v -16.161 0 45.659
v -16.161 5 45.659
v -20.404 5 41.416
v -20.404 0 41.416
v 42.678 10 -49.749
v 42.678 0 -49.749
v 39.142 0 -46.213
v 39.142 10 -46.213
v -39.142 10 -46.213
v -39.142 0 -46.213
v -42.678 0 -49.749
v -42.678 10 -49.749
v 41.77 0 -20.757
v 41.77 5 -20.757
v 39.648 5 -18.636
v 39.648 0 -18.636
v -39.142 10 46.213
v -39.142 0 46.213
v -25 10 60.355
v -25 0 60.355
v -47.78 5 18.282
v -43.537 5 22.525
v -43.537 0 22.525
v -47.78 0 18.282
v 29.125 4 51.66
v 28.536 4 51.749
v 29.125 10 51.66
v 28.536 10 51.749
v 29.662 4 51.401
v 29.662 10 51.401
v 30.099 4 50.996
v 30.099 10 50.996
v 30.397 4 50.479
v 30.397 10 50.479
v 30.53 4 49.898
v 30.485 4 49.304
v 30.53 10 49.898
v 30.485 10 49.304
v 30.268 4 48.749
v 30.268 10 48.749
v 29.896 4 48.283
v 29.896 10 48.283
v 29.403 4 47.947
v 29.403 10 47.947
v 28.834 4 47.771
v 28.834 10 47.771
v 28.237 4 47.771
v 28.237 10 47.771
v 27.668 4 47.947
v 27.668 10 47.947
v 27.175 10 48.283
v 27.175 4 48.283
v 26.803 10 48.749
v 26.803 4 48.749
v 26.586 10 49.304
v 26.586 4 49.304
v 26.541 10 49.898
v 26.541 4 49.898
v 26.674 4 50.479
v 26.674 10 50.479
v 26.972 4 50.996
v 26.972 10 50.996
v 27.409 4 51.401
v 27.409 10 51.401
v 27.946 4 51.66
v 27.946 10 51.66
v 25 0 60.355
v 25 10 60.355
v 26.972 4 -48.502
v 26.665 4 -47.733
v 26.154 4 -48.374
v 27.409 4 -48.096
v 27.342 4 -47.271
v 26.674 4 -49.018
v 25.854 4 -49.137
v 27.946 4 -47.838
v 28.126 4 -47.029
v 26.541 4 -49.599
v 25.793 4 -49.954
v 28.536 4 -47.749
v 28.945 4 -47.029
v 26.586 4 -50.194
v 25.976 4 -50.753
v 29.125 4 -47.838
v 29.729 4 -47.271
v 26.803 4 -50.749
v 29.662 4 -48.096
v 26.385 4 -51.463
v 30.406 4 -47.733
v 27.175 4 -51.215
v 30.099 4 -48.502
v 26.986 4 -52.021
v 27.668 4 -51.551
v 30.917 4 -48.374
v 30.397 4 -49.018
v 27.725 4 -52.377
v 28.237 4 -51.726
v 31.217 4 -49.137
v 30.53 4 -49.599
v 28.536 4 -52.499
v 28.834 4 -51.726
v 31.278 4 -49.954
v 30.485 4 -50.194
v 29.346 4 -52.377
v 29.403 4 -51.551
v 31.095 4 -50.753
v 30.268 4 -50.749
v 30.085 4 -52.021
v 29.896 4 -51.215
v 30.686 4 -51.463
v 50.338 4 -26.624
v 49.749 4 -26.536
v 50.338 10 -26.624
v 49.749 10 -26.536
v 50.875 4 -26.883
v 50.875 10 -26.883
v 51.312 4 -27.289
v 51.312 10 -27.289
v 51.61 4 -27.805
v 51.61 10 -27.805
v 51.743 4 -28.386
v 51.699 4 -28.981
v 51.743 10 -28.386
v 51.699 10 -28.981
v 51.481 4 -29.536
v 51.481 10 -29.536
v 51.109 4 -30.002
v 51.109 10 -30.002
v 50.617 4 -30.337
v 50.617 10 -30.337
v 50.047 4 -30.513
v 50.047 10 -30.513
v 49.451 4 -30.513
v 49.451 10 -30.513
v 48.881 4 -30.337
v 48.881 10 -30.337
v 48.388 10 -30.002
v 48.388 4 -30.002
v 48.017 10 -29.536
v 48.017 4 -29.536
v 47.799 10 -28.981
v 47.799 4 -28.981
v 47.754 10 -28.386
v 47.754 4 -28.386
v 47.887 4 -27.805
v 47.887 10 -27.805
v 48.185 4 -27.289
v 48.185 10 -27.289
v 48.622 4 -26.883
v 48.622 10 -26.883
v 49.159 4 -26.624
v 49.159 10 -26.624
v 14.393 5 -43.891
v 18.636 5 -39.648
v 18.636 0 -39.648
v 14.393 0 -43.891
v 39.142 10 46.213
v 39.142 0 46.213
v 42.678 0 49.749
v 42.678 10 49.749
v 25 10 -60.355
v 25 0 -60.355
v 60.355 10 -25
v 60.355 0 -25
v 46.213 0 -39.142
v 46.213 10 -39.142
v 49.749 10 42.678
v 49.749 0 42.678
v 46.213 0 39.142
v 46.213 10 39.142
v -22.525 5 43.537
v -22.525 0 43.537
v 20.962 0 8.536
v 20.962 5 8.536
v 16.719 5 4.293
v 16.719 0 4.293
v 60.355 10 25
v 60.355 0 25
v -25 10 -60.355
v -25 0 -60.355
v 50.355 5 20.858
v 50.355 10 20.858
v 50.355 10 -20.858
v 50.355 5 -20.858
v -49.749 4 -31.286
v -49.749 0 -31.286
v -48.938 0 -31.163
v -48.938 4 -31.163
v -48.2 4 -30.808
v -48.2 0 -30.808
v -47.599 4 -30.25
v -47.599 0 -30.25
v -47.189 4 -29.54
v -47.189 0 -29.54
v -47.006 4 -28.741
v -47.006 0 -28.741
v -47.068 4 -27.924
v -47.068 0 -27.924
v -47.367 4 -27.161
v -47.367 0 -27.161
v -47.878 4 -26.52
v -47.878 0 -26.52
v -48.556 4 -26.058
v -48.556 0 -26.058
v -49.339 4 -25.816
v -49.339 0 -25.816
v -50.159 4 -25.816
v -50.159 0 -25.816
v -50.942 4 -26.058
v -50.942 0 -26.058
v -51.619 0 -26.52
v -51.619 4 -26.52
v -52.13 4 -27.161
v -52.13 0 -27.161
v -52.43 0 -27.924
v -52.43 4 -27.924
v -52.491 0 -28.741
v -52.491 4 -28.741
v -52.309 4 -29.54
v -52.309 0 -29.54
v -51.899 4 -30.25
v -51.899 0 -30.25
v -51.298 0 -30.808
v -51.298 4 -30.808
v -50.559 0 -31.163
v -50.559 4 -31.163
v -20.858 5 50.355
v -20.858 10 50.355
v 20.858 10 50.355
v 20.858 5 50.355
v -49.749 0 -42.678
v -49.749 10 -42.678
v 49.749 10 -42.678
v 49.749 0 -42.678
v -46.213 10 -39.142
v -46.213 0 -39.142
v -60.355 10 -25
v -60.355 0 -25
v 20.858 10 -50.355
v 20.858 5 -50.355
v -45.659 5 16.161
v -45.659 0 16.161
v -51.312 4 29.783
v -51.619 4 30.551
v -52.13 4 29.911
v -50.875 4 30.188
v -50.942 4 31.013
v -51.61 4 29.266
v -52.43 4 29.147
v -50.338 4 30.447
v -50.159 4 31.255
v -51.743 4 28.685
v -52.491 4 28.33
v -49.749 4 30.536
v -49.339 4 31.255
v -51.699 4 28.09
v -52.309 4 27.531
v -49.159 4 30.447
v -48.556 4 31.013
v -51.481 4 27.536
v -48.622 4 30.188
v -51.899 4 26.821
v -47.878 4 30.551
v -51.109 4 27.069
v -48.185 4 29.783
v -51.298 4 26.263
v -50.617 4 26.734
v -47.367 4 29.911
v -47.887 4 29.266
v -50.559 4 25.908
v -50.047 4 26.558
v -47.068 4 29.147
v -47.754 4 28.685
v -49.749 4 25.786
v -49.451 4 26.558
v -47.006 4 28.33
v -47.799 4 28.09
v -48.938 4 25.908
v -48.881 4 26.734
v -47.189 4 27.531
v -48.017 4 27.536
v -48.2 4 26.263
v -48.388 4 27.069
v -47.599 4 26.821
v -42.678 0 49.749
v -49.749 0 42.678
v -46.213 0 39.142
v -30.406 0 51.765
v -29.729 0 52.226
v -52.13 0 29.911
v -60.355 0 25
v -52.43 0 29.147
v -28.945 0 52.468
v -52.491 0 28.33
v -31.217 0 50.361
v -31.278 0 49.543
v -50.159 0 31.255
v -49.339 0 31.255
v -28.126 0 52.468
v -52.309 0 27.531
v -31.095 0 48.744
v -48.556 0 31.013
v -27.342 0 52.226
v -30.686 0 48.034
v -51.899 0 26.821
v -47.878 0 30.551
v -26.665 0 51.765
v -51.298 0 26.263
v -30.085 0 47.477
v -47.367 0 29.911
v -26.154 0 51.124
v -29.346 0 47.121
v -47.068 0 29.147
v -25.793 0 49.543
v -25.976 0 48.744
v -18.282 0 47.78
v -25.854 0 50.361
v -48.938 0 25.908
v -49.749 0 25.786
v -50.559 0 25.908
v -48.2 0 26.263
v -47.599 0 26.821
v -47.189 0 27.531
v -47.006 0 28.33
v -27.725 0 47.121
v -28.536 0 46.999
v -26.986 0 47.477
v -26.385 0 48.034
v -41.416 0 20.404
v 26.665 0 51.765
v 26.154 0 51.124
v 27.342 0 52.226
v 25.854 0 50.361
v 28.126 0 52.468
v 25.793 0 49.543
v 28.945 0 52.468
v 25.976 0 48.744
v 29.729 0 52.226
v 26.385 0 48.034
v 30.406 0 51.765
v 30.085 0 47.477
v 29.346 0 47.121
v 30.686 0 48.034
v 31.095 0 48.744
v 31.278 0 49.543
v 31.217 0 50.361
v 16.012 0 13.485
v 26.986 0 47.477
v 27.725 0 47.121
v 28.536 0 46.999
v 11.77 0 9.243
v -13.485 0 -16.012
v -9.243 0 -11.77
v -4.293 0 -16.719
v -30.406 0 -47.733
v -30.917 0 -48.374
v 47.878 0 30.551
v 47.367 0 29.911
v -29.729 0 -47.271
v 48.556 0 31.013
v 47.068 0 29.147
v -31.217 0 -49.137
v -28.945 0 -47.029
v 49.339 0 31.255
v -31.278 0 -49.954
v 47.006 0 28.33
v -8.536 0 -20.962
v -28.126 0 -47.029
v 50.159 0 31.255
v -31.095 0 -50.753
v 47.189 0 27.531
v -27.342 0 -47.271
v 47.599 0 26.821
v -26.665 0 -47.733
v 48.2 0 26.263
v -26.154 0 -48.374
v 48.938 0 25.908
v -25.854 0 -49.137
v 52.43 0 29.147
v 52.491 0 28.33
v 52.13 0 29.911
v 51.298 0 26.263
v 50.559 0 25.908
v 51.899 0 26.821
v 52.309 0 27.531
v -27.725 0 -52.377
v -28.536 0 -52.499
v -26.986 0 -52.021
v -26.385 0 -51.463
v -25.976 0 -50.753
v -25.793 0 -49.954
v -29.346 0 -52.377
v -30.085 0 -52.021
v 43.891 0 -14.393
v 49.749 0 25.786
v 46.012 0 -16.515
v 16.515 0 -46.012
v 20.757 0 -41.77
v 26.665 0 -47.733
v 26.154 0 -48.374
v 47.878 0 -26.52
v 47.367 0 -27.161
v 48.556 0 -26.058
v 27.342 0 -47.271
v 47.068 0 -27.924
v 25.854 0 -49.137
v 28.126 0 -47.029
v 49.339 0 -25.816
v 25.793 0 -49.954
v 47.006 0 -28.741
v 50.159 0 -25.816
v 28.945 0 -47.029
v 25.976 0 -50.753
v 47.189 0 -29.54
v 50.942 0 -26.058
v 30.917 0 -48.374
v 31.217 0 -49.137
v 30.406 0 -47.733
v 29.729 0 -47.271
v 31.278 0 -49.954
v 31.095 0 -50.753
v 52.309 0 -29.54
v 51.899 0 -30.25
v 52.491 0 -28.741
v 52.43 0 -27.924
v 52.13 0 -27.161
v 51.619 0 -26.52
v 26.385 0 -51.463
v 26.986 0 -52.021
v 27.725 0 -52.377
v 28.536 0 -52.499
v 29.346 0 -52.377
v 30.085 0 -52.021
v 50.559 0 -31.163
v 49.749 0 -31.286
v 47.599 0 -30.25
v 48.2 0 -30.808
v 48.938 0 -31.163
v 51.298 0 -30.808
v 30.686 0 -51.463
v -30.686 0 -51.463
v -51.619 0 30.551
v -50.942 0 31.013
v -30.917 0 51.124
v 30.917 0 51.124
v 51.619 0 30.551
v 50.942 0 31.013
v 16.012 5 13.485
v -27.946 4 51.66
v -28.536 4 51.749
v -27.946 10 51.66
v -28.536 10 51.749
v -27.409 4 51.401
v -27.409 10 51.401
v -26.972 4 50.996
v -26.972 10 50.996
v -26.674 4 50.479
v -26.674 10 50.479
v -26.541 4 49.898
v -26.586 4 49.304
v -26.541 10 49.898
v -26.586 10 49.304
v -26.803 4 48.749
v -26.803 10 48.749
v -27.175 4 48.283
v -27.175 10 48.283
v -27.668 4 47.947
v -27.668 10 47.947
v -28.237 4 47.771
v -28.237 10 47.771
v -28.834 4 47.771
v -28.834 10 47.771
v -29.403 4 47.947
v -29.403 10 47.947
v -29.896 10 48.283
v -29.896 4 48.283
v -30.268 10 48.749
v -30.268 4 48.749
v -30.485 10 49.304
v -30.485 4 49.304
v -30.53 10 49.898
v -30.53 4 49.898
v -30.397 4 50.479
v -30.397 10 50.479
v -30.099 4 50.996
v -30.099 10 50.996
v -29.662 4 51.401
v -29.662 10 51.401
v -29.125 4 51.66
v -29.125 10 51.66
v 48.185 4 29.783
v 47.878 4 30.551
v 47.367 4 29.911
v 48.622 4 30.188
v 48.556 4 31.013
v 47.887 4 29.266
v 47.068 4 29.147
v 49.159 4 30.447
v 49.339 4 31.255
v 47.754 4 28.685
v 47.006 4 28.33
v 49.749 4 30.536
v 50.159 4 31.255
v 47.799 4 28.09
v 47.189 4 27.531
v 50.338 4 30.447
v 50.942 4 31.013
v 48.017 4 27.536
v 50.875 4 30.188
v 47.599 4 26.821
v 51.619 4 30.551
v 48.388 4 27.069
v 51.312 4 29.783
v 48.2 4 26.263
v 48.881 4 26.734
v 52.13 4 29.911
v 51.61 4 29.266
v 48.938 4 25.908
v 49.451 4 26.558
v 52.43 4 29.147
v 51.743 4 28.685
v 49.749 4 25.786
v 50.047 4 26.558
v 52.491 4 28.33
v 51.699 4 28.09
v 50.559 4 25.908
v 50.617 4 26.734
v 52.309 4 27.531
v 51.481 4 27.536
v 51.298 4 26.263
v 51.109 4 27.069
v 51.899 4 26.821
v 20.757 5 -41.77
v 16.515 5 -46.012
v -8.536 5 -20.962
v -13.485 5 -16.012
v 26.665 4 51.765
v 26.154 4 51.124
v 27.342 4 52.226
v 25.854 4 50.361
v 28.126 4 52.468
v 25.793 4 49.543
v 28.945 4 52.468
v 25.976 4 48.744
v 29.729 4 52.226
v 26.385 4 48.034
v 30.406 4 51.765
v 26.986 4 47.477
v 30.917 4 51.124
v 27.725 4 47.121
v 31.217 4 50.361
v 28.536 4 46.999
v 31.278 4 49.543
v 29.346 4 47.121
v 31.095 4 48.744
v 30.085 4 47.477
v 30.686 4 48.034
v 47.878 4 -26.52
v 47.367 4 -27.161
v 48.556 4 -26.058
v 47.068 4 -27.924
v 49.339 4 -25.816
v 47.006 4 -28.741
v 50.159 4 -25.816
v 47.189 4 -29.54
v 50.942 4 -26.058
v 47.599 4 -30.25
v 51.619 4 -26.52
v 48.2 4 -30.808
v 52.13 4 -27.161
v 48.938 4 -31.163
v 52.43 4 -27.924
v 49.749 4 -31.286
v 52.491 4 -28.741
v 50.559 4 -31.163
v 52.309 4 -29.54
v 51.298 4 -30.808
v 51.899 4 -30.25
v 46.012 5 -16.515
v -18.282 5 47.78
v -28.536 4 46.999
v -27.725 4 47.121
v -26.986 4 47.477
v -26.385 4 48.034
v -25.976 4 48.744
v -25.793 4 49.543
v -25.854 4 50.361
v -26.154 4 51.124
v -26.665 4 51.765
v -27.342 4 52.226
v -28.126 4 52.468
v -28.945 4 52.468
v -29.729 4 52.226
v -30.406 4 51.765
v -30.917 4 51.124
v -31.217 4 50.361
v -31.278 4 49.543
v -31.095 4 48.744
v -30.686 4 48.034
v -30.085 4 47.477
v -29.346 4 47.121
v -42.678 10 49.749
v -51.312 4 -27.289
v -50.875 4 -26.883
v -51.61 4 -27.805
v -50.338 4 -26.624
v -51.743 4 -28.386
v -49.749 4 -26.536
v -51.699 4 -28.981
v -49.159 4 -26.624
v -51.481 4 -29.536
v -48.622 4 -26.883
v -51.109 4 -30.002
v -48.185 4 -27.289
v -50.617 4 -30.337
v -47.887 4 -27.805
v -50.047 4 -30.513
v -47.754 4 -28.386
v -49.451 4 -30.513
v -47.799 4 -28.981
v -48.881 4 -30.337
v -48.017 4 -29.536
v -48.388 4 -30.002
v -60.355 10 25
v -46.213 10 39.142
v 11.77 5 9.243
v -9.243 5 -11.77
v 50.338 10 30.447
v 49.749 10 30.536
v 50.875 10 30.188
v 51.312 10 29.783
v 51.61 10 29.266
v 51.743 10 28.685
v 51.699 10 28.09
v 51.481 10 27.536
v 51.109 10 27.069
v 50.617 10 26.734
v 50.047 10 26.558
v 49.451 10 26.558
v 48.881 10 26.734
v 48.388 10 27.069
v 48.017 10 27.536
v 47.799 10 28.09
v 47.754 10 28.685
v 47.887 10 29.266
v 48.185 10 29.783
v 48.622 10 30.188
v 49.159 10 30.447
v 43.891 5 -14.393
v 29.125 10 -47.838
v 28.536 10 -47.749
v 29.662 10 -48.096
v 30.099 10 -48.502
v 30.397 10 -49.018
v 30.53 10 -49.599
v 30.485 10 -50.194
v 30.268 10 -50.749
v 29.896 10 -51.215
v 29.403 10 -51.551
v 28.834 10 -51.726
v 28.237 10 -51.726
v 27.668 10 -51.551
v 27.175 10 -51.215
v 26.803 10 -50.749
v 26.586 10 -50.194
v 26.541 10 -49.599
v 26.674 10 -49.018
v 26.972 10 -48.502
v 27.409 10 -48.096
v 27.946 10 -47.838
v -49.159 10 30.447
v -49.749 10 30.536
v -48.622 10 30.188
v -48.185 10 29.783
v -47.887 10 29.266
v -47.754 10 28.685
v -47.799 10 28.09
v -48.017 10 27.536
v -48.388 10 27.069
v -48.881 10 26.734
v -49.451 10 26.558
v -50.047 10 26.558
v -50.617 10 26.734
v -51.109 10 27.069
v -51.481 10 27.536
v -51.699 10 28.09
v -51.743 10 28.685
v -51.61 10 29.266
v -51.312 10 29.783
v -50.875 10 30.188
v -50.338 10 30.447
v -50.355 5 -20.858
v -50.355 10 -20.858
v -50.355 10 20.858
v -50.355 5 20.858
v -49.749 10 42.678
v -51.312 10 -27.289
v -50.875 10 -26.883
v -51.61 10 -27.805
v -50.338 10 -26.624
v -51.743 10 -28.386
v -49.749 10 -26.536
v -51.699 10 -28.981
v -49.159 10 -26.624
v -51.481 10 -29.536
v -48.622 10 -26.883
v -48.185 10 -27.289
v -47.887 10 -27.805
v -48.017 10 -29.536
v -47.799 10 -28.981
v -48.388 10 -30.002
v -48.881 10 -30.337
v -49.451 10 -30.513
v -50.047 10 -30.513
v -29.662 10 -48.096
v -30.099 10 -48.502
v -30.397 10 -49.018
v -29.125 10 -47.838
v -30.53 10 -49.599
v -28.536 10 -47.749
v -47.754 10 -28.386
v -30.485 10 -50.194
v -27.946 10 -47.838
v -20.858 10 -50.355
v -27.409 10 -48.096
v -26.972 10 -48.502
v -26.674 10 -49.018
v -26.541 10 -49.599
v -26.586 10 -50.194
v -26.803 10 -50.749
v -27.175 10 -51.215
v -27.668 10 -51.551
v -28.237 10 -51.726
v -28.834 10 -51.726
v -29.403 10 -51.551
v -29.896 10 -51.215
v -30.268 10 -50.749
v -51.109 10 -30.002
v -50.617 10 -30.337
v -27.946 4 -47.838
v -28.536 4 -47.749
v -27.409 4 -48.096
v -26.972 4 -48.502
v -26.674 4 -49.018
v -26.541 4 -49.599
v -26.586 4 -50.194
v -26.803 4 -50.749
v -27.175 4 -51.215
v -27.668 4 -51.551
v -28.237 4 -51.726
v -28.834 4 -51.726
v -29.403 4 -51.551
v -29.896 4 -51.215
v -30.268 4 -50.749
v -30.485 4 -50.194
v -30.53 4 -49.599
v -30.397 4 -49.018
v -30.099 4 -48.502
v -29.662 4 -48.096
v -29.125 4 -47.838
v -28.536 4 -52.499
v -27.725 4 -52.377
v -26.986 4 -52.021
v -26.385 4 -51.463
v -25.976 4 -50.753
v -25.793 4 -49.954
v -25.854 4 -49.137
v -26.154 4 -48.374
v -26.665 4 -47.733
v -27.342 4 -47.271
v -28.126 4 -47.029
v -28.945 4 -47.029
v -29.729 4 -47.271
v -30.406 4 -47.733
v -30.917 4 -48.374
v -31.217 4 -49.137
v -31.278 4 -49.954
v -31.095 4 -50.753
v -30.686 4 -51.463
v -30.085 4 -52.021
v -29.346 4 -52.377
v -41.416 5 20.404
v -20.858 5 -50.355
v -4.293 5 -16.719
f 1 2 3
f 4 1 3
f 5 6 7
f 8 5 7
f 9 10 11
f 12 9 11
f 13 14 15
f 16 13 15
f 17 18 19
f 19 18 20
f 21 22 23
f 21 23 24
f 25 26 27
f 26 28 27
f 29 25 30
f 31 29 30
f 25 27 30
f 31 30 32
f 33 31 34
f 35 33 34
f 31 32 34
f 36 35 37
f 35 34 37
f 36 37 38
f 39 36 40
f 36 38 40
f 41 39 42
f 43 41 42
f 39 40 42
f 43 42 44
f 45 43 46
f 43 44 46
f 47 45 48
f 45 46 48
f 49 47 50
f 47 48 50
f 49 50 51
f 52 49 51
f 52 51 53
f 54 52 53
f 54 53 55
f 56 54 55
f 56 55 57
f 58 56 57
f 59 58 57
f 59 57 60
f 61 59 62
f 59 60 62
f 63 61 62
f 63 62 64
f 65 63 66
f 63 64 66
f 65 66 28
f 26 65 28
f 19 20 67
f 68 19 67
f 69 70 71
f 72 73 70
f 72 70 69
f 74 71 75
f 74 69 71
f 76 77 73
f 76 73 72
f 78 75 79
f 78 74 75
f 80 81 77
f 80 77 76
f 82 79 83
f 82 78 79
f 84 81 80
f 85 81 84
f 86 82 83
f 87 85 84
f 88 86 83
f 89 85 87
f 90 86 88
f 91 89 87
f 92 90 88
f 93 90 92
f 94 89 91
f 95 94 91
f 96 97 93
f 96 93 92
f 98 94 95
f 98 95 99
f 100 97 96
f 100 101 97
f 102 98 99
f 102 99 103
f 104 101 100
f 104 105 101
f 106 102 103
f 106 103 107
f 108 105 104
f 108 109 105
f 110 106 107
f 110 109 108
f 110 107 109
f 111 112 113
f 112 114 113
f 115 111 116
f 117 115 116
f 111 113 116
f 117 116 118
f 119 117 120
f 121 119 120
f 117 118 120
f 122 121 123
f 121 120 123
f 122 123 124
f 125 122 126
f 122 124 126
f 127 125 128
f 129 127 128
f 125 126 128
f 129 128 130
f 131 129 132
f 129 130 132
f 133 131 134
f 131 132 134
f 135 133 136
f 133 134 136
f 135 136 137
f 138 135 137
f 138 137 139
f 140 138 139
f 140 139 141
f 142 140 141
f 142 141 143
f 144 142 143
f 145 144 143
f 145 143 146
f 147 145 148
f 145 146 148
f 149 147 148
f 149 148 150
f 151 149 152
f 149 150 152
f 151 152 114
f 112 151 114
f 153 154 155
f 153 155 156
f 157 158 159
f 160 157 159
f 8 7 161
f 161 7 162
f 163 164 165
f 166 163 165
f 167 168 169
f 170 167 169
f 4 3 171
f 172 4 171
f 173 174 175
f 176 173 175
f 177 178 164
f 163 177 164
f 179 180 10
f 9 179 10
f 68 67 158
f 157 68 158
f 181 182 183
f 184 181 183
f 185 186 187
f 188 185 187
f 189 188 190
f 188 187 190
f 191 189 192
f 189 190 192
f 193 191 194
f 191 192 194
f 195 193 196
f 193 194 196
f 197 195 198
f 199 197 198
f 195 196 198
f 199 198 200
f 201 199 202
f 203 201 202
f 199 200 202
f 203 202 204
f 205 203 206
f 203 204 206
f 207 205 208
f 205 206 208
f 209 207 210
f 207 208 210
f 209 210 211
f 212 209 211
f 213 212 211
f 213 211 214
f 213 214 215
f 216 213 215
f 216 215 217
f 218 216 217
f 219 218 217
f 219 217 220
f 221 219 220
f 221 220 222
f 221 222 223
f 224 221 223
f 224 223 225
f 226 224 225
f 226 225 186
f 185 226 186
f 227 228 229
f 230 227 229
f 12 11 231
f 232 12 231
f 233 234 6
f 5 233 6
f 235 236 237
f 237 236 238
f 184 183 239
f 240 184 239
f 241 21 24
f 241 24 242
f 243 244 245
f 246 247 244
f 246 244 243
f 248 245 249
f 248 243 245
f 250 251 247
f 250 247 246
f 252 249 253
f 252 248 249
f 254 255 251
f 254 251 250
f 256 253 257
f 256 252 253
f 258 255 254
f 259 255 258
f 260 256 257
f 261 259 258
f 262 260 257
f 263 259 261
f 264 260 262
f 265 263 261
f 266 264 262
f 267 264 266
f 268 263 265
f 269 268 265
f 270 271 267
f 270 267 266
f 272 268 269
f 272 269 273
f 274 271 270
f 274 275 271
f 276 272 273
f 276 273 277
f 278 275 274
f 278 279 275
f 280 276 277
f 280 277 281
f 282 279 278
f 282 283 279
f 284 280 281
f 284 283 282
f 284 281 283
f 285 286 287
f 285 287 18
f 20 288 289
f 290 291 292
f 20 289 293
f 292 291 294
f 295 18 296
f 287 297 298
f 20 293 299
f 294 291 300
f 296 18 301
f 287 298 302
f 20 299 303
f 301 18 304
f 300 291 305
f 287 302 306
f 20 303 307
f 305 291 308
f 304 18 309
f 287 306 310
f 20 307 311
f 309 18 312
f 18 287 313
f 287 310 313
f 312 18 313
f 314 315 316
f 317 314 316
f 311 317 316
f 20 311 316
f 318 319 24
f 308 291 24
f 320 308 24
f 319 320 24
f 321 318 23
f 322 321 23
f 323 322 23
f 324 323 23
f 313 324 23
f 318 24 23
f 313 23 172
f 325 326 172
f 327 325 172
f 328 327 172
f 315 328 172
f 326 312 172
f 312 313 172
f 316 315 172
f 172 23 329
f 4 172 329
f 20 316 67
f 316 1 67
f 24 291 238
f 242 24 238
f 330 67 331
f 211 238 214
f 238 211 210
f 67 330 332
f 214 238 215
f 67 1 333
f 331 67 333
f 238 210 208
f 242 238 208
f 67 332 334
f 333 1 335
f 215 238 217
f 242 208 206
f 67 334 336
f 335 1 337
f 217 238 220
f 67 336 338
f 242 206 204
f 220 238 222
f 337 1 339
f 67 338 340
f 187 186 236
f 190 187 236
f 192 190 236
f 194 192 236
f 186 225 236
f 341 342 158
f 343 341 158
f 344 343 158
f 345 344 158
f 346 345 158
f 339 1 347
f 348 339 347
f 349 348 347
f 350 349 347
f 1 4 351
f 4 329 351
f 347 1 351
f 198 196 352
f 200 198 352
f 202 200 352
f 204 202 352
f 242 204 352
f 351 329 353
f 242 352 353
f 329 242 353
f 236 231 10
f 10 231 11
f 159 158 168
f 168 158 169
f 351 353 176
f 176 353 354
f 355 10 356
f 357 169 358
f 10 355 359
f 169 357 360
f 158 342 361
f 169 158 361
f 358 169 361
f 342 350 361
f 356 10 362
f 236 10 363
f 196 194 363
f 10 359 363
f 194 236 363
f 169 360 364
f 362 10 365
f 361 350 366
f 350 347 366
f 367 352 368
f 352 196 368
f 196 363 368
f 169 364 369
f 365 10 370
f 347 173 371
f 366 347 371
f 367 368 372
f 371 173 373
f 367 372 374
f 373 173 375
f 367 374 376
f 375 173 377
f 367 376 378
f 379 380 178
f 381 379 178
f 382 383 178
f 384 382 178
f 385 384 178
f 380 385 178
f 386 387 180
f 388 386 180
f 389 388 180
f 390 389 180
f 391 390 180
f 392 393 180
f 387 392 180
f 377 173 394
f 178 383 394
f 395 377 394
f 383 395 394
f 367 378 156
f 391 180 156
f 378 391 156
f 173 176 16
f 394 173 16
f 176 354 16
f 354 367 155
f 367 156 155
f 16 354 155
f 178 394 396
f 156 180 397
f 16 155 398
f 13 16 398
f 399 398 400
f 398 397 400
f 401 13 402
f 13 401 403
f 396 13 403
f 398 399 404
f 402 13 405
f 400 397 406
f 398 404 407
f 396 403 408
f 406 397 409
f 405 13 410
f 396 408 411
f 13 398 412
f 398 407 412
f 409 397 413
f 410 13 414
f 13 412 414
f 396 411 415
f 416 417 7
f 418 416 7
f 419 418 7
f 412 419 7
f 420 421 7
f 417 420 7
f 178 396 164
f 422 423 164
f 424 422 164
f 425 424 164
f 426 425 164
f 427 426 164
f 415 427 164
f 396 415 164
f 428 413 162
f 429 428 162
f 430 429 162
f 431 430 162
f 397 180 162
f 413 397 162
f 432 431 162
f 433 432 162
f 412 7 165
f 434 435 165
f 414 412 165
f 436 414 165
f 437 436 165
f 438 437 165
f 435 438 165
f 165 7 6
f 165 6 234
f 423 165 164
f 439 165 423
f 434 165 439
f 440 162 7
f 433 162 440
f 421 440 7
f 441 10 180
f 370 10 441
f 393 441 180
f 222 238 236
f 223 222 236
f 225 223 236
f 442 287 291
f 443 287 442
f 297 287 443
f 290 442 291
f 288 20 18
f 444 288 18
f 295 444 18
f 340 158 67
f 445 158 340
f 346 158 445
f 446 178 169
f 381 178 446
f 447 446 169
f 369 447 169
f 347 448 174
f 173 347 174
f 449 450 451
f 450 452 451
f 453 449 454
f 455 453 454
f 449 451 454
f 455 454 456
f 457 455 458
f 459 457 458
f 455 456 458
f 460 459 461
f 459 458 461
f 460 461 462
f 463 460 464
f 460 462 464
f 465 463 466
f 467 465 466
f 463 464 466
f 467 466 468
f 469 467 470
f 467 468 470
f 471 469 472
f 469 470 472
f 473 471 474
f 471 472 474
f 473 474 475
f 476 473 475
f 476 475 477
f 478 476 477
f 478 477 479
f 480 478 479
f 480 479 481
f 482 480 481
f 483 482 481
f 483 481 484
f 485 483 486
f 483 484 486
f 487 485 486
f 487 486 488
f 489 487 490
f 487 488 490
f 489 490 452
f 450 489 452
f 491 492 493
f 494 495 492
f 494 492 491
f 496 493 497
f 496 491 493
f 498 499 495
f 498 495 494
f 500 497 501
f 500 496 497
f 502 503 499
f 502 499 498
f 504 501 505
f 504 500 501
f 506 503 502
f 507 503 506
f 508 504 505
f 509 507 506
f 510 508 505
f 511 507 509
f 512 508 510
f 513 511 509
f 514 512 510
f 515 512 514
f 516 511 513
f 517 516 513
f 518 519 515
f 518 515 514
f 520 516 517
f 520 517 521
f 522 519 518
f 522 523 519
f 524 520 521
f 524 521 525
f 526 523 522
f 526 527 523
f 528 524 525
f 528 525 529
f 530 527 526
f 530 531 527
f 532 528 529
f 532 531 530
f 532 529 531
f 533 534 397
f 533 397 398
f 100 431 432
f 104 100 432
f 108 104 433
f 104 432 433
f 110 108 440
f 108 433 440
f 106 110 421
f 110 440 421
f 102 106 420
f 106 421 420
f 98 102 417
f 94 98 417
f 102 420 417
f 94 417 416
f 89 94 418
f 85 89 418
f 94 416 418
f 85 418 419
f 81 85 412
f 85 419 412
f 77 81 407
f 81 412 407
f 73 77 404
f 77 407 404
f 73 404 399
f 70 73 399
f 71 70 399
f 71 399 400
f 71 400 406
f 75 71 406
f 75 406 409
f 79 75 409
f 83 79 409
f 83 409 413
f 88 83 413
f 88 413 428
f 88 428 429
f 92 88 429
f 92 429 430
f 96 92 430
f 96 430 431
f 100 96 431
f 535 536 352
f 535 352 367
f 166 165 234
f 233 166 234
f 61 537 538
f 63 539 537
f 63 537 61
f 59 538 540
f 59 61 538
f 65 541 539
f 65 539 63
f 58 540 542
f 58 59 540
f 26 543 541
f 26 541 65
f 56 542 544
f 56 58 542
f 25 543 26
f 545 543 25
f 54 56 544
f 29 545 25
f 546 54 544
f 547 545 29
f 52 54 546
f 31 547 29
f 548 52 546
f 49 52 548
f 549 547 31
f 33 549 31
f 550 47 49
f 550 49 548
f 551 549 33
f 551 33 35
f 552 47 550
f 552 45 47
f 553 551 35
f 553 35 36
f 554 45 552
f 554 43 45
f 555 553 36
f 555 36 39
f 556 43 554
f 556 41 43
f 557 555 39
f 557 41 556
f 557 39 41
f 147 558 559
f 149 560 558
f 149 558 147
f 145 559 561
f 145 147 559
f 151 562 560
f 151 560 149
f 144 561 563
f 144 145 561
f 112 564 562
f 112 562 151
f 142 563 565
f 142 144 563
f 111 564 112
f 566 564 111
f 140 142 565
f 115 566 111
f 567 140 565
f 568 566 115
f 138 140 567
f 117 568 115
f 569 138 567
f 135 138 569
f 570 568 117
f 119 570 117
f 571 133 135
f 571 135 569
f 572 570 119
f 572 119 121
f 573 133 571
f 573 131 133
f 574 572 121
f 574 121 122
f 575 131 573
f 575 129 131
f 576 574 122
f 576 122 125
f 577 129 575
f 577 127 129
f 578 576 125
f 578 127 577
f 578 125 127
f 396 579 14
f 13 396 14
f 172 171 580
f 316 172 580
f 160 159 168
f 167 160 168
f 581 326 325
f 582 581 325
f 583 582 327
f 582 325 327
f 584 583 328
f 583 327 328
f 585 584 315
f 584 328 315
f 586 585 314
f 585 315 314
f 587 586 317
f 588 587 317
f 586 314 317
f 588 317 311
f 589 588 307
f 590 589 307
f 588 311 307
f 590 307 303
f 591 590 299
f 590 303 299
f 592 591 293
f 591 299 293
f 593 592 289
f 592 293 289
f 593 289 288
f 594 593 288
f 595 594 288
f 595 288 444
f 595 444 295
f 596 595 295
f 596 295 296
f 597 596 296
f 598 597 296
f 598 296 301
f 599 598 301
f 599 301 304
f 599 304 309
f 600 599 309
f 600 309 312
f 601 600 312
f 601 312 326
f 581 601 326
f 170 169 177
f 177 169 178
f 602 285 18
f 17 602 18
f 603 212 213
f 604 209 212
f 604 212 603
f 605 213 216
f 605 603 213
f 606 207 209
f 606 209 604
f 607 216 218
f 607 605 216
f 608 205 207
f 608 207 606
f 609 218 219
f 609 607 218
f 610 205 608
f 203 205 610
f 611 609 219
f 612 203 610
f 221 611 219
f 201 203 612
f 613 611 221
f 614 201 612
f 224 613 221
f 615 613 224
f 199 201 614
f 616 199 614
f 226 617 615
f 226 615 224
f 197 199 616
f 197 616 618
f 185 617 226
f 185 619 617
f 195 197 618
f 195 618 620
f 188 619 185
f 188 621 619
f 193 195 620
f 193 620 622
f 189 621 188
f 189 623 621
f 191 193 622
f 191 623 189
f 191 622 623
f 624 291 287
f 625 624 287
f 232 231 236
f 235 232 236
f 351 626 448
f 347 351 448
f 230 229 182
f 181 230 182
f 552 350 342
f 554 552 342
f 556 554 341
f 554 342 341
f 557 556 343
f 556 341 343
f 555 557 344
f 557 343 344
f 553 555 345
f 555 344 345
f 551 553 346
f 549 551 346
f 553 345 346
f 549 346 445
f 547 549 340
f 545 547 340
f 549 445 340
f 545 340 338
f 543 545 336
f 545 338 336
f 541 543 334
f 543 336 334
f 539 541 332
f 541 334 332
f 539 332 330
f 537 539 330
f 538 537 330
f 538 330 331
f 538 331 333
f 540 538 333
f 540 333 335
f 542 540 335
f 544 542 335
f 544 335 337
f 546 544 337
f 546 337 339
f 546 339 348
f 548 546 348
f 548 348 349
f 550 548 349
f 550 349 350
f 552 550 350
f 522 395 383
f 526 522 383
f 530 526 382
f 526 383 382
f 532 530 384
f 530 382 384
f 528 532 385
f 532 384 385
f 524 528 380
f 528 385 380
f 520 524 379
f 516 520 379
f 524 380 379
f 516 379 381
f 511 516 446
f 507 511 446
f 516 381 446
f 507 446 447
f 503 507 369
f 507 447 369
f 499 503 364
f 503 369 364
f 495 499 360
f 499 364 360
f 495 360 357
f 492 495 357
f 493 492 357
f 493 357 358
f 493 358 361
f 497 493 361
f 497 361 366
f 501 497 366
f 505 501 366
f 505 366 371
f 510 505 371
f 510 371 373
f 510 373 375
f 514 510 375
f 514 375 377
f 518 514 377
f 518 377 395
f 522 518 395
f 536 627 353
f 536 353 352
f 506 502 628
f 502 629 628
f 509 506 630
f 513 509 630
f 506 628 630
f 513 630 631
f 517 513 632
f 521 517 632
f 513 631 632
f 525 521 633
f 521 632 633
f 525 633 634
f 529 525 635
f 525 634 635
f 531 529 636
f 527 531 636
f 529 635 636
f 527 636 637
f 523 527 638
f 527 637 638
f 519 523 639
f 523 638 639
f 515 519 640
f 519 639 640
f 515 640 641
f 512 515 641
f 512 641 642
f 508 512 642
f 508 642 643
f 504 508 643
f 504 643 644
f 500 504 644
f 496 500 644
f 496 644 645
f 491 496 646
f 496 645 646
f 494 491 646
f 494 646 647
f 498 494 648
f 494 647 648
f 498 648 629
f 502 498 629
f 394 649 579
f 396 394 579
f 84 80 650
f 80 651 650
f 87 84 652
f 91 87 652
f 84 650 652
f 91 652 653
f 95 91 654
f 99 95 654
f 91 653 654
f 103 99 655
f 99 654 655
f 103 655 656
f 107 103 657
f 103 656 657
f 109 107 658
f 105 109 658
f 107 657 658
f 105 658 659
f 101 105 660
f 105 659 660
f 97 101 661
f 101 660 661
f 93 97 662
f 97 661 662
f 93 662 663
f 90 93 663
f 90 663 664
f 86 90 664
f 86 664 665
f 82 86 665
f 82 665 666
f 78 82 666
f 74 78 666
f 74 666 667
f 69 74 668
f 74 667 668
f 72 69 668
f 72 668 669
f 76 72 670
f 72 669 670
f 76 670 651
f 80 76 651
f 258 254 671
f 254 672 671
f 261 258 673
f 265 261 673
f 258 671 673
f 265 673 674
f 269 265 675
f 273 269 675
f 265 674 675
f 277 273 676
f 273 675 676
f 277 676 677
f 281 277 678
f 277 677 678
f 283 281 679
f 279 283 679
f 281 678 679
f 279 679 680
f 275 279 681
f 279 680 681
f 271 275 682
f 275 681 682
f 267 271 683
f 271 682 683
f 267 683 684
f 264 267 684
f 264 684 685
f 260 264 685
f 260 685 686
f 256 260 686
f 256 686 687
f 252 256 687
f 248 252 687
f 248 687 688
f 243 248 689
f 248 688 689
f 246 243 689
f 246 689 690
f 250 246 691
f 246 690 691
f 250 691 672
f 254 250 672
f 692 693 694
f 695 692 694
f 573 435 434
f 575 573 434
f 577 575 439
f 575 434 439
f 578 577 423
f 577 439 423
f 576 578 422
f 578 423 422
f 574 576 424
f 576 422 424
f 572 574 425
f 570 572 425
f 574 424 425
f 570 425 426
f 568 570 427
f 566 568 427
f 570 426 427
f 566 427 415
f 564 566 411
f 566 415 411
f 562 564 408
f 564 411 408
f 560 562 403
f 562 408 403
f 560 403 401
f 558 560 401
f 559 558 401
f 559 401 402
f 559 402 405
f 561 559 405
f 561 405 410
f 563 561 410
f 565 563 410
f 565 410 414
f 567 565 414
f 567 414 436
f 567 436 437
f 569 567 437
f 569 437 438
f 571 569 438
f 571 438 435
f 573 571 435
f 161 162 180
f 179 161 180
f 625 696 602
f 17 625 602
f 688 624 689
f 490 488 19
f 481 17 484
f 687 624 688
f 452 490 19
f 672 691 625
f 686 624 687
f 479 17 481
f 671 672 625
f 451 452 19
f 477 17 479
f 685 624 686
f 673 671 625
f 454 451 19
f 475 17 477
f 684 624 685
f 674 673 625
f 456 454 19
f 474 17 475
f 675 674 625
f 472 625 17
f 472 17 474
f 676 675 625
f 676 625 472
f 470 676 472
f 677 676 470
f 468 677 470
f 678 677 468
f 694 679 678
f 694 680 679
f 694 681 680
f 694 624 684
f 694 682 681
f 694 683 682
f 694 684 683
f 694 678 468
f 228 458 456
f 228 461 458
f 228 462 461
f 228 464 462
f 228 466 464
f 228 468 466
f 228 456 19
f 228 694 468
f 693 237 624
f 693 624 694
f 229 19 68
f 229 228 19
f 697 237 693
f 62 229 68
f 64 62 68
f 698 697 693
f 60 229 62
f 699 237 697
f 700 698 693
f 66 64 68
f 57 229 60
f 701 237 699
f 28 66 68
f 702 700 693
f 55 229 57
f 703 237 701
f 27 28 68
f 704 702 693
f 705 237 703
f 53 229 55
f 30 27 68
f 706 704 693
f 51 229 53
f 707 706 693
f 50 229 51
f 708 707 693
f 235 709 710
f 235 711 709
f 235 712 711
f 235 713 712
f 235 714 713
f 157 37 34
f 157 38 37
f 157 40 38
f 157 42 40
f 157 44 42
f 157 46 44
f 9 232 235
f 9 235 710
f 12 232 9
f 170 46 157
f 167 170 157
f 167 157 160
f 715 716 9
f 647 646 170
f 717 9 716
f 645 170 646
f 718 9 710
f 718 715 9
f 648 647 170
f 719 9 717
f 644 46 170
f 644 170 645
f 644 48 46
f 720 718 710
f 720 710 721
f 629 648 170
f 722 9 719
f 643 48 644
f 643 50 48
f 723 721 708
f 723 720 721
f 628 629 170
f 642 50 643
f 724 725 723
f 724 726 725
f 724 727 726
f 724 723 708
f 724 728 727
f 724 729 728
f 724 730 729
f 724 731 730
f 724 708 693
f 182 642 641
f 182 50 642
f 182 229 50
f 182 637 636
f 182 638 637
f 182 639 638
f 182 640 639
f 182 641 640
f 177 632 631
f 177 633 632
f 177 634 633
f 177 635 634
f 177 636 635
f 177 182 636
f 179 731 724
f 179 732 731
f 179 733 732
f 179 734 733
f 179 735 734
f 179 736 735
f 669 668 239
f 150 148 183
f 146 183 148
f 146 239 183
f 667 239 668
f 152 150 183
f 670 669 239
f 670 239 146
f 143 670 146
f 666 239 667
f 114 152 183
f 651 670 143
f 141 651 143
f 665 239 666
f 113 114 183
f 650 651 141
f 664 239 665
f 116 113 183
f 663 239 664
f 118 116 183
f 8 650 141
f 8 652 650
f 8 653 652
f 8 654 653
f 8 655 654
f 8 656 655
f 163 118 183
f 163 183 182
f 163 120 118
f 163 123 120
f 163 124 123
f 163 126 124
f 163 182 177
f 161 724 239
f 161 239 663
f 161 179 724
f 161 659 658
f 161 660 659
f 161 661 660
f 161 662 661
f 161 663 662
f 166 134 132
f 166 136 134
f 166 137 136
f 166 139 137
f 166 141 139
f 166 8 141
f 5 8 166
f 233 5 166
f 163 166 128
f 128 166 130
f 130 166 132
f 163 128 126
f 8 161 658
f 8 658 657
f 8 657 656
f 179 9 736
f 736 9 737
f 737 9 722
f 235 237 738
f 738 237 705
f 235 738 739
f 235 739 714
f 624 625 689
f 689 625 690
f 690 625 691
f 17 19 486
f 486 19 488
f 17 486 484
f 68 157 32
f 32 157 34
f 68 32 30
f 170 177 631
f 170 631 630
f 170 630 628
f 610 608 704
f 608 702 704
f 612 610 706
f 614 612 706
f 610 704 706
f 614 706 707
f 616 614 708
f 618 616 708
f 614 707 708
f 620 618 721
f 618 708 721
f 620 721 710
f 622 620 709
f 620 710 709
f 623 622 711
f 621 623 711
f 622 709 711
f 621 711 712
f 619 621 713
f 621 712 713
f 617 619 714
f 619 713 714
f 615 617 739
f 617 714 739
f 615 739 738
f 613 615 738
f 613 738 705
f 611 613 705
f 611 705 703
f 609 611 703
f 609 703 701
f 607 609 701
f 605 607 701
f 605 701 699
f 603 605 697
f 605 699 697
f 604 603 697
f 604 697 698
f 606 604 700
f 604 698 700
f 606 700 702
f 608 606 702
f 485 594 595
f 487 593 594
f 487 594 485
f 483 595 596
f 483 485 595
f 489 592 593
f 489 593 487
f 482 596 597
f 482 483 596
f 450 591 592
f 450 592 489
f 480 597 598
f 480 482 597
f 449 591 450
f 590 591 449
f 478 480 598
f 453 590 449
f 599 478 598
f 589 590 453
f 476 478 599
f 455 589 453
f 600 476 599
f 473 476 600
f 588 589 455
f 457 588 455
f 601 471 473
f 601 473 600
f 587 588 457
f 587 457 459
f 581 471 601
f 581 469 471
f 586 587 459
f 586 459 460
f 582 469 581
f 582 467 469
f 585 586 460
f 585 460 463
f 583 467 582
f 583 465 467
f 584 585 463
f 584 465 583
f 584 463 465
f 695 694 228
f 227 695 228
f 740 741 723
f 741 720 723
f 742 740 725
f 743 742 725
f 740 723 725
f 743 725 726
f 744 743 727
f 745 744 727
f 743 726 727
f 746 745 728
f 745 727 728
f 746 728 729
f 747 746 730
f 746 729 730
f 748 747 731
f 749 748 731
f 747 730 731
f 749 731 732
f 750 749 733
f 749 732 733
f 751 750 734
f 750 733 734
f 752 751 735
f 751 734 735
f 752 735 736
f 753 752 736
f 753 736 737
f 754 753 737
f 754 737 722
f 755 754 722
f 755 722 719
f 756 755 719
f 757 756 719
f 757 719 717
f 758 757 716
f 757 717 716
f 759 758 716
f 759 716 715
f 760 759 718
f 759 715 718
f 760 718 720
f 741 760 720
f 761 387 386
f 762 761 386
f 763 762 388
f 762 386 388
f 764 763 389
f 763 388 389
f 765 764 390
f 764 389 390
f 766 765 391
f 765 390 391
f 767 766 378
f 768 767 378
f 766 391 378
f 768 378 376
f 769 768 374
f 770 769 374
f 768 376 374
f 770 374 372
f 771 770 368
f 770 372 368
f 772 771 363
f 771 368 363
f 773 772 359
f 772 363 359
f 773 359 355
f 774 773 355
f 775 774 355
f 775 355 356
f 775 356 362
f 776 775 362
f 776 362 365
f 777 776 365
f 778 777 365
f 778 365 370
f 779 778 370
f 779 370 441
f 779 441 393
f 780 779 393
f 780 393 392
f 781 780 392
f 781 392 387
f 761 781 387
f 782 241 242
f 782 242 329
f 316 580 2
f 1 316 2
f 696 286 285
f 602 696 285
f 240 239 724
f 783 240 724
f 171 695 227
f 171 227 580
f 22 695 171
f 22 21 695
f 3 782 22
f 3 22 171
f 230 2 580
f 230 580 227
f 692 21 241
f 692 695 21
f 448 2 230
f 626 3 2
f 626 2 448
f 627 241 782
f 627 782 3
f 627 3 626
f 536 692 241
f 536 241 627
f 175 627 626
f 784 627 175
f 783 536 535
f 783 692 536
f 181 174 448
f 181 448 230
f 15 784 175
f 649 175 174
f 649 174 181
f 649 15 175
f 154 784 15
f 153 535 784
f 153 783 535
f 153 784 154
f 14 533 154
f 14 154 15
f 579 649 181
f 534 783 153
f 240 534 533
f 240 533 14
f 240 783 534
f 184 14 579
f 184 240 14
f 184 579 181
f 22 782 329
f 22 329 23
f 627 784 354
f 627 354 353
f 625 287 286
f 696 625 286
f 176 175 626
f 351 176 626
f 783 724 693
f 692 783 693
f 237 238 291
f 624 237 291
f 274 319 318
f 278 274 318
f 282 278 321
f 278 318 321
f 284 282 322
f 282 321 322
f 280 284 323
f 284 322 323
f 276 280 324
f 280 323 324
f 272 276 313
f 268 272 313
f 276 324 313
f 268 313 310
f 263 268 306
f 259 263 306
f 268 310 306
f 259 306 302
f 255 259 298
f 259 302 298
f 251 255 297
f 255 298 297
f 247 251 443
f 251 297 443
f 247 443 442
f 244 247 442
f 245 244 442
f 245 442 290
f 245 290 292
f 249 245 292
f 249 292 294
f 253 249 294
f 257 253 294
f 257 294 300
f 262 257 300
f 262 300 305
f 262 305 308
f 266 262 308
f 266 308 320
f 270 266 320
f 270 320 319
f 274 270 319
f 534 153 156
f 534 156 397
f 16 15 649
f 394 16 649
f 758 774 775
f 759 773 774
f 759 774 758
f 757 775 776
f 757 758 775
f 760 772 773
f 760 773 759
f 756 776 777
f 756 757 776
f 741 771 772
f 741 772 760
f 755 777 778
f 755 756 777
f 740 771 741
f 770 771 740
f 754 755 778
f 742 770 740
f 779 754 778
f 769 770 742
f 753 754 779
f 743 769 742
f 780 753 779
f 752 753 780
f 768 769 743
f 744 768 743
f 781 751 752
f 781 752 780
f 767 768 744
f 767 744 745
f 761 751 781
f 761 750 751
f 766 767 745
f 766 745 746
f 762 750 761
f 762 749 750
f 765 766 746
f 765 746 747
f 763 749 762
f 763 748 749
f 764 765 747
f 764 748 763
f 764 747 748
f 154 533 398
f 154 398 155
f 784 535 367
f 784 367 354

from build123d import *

# Parameters (mm, degrees)
BOSS_EXTRU_2_DEPTH                                   = 10
CHAMBRAGE_POUR_T_TE_CYLINDRIQUE_FENDUE_M_D           = 4
CHAMBRAGE_POUR_T_TE_CYLINDRIQUE_FENDUE_M_CBORE_D     = 5.5
CHAMBRAGE_POUR_T_TE_CYLINDRIQUE_FENDUE_M_CBORE_DEPTH = 4
ENL_V_MAT_EXTRU_1_DEPTH                              = 5
ENL_V_MAT_EXTRU_2_REACH                              = 87.502


with BuildPart() as part:
    # Esquisse1 → Boss.-Extru.2 (new body)
    with BuildSketch(Plane(origin=(0, 0, 0), x_dir=(1, 0, 0), z_dir=(0, 1, 0))):
        Polygon((60.355339059, 25), (25, 60.355339059), (-25, 60.355339059), (-60.355339059, 25), (-60.355339059, -25), (-25, -60.355339059), (25, -60.355339059), (60.355339059, -25), align=None)
        Polygon((39.142135624, 46.213203436), (46.213203436, 39.142135624), (49.748737342, 42.67766953), (42.67766953, 49.748737342), align=None)
        Polygon((49.748737342, -42.67766953), (46.213203436, -39.142135624), (39.142135624, -46.213203436), (42.67766953, -49.748737342), align=None)
        Polygon((-42.67766953, -49.748737342), (-39.142135624, -46.213203436), (-46.213203436, -39.142135624), (-49.748737342, -42.67766953), align=None)
        Polygon((-46.213203436, 39.142135624), (-39.142135624, 46.213203436), (-42.67766953, 49.748737342), (-49.748737342, 42.67766953), align=None)
    extrude(amount=BOSS_EXTRU_2_DEPTH)

    # Chambrage pour tête cylindrique fendue M31 (through all)
    with Locations(Plane(origin=(-49.748737342, 0, -28.535533906), x_dir=(0, 0, -1), z_dir=(0, -1, 0))):
        with Locations((0, 0), (21.213203436, 21.213203436), (21.213203436, 78.284271248), (0, 99.497474684), (-78.284271248, 78.284271248), (-57.071067812, 99.497474684), (-78.284271248, 21.213203436), (-57.071067812, 0)):
            CounterBoreHole(CHAMBRAGE_POUR_T_TE_CYLINDRIQUE_FENDUE_M_D / 2, CHAMBRAGE_POUR_T_TE_CYLINDRIQUE_FENDUE_M_CBORE_D / 2, CHAMBRAGE_POUR_T_TE_CYLINDRIQUE_FENDUE_M_CBORE_DEPTH)

    # Esquisse6 → Enlèv. mat.-Extru.1 (cut)
    with BuildSketch(Plane(origin=(0, 10, 0), x_dir=(1, 0, 0), z_dir=(0, 1, 0))):
        Polygon((20.857864376, 50.355339059), (-20.857864376, 50.355339059), (-50.355339059, 20.857864376), (-50.355339059, -20.857864376), (-20.857864376, -50.355339059), (20.857864376, -50.355339059), (50.355339059, -20.857864376), (50.355339059, 20.857864376), align=None)
    extrude(amount=-ENL_V_MAT_EXTRU_1_DEPTH, mode=Mode.SUBTRACT)

    # Esquisse7 → Enlèv. mat.-Extru.2 (cut, up to next)
    with BuildSketch(Plane(origin=(0, 5, 0), x_dir=(1, 0, 0), z_dir=(0, 1, 0)), mode=Mode.PRIVATE) as enl_v_mat_extru_2_sk1:
        Polygon((-47.779960262, -18.282485579), (-45.658639918, -16.161165235), (-41.415999231, -20.403805922), (-43.537319575, -22.525126266), align=None)
    enl_v_mat_extru_2_tool1 = extrude(enl_v_mat_extru_2_sk1.sketch, amount=-ENL_V_MAT_EXTRU_2_REACH, mode=Mode.PRIVATE) & part.part
    # Esquisse7 → Enlèv. mat.-Extru.2 (cut, up to next)
    with BuildSketch(Plane(origin=(0, 5, 0), x_dir=(1, 0, 0), z_dir=(0, 1, 0)), mode=Mode.PRIVATE) as enl_v_mat_extru_2_sk2:
        Polygon((-13.485281374, 16.012193309), (-8.535533906, 20.961940777), (-4.292893219, 16.71930009), (-9.242640687, 11.769552622), align=None)
    enl_v_mat_extru_2_tool2 = extrude(enl_v_mat_extru_2_sk2.sketch, amount=-ENL_V_MAT_EXTRU_2_REACH, mode=Mode.PRIVATE) & part.part
    # Esquisse7 → Enlèv. mat.-Extru.2 (cut, up to next)
    with BuildSketch(Plane(origin=(0, 5, 0), x_dir=(1, 0, 0), z_dir=(0, 1, 0)), mode=Mode.PRIVATE) as enl_v_mat_extru_2_sk3:
        Polygon((14.393398282, 43.890872965), (16.514718626, 46.012193309), (20.757359313, 41.769552622), (18.636038969, 39.648232278), align=None)
    enl_v_mat_extru_2_tool3 = extrude(enl_v_mat_extru_2_sk3.sketch, amount=-ENL_V_MAT_EXTRU_2_REACH, mode=Mode.PRIVATE) & part.part
    # Esquisse7 → Enlèv. mat.-Extru.2 (cut, up to next)
    with BuildSketch(Plane(origin=(0, 5, 0), x_dir=(1, 0, 0), z_dir=(0, 1, 0)), mode=Mode.PRIVATE) as enl_v_mat_extru_2_sk4:
        Polygon((-20.403805922, -41.415999231), (-22.525126266, -43.537319575), (-18.282485579, -47.779960262), (-16.161165235, -45.658639918), align=None)
    enl_v_mat_extru_2_tool4 = extrude(enl_v_mat_extru_2_sk4.sketch, amount=-ENL_V_MAT_EXTRU_2_REACH, mode=Mode.PRIVATE) & part.part
    # Esquisse7 → Enlèv. mat.-Extru.2 (cut, up to next)
    with BuildSketch(Plane(origin=(0, 5, 0), x_dir=(1, 0, 0), z_dir=(0, 1, 0)), mode=Mode.PRIVATE) as enl_v_mat_extru_2_sk5:
        Polygon((39.648232278, 18.636038969), (43.890872965, 14.393398282), (46.012193309, 16.514718626), (41.769552622, 20.757359313), align=None)
    enl_v_mat_extru_2_tool5 = extrude(enl_v_mat_extru_2_sk5.sketch, amount=-ENL_V_MAT_EXTRU_2_REACH, mode=Mode.PRIVATE) & part.part
    # Esquisse7 → Enlèv. mat.-Extru.2 (cut, up to next)
    with BuildSketch(Plane(origin=(0, 5, 0), x_dir=(1, 0, 0), z_dir=(0, 1, 0)), mode=Mode.PRIVATE) as enl_v_mat_extru_2_sk6:
        Polygon((16.71930009, -4.292893219), (11.769552622, -9.242640687), (16.012193309, -13.485281374), (20.961940777, -8.535533906), align=None)
    enl_v_mat_extru_2_tool6 = extrude(enl_v_mat_extru_2_sk6.sketch, amount=-ENL_V_MAT_EXTRU_2_REACH, mode=Mode.PRIVATE) & part.part
    add(enl_v_mat_extru_2_tool1.solids().sort_by_distance((-44.59798, 5, 19.343146))[0], mode=Mode.SUBTRACT)
    add(enl_v_mat_extru_2_tool2.solids().sort_by_distance((-8.889087, 5, -16.365747))[0], mode=Mode.SUBTRACT)
    add(enl_v_mat_extru_2_tool3.solids().sort_by_distance((17.575379, 5, -42.830213))[0], mode=Mode.SUBTRACT)
    add(enl_v_mat_extru_2_tool4.solids().sort_by_distance((-19.343146, 5, 44.59798))[0], mode=Mode.SUBTRACT)
    add(enl_v_mat_extru_2_tool5.solids().sort_by_distance((42.830213, 5, -17.575379))[0], mode=Mode.SUBTRACT)
    add(enl_v_mat_extru_2_tool6.solids().sort_by_distance((16.365747, 5, 8.889087))[0], mode=Mode.SUBTRACT)


solid = part.part
